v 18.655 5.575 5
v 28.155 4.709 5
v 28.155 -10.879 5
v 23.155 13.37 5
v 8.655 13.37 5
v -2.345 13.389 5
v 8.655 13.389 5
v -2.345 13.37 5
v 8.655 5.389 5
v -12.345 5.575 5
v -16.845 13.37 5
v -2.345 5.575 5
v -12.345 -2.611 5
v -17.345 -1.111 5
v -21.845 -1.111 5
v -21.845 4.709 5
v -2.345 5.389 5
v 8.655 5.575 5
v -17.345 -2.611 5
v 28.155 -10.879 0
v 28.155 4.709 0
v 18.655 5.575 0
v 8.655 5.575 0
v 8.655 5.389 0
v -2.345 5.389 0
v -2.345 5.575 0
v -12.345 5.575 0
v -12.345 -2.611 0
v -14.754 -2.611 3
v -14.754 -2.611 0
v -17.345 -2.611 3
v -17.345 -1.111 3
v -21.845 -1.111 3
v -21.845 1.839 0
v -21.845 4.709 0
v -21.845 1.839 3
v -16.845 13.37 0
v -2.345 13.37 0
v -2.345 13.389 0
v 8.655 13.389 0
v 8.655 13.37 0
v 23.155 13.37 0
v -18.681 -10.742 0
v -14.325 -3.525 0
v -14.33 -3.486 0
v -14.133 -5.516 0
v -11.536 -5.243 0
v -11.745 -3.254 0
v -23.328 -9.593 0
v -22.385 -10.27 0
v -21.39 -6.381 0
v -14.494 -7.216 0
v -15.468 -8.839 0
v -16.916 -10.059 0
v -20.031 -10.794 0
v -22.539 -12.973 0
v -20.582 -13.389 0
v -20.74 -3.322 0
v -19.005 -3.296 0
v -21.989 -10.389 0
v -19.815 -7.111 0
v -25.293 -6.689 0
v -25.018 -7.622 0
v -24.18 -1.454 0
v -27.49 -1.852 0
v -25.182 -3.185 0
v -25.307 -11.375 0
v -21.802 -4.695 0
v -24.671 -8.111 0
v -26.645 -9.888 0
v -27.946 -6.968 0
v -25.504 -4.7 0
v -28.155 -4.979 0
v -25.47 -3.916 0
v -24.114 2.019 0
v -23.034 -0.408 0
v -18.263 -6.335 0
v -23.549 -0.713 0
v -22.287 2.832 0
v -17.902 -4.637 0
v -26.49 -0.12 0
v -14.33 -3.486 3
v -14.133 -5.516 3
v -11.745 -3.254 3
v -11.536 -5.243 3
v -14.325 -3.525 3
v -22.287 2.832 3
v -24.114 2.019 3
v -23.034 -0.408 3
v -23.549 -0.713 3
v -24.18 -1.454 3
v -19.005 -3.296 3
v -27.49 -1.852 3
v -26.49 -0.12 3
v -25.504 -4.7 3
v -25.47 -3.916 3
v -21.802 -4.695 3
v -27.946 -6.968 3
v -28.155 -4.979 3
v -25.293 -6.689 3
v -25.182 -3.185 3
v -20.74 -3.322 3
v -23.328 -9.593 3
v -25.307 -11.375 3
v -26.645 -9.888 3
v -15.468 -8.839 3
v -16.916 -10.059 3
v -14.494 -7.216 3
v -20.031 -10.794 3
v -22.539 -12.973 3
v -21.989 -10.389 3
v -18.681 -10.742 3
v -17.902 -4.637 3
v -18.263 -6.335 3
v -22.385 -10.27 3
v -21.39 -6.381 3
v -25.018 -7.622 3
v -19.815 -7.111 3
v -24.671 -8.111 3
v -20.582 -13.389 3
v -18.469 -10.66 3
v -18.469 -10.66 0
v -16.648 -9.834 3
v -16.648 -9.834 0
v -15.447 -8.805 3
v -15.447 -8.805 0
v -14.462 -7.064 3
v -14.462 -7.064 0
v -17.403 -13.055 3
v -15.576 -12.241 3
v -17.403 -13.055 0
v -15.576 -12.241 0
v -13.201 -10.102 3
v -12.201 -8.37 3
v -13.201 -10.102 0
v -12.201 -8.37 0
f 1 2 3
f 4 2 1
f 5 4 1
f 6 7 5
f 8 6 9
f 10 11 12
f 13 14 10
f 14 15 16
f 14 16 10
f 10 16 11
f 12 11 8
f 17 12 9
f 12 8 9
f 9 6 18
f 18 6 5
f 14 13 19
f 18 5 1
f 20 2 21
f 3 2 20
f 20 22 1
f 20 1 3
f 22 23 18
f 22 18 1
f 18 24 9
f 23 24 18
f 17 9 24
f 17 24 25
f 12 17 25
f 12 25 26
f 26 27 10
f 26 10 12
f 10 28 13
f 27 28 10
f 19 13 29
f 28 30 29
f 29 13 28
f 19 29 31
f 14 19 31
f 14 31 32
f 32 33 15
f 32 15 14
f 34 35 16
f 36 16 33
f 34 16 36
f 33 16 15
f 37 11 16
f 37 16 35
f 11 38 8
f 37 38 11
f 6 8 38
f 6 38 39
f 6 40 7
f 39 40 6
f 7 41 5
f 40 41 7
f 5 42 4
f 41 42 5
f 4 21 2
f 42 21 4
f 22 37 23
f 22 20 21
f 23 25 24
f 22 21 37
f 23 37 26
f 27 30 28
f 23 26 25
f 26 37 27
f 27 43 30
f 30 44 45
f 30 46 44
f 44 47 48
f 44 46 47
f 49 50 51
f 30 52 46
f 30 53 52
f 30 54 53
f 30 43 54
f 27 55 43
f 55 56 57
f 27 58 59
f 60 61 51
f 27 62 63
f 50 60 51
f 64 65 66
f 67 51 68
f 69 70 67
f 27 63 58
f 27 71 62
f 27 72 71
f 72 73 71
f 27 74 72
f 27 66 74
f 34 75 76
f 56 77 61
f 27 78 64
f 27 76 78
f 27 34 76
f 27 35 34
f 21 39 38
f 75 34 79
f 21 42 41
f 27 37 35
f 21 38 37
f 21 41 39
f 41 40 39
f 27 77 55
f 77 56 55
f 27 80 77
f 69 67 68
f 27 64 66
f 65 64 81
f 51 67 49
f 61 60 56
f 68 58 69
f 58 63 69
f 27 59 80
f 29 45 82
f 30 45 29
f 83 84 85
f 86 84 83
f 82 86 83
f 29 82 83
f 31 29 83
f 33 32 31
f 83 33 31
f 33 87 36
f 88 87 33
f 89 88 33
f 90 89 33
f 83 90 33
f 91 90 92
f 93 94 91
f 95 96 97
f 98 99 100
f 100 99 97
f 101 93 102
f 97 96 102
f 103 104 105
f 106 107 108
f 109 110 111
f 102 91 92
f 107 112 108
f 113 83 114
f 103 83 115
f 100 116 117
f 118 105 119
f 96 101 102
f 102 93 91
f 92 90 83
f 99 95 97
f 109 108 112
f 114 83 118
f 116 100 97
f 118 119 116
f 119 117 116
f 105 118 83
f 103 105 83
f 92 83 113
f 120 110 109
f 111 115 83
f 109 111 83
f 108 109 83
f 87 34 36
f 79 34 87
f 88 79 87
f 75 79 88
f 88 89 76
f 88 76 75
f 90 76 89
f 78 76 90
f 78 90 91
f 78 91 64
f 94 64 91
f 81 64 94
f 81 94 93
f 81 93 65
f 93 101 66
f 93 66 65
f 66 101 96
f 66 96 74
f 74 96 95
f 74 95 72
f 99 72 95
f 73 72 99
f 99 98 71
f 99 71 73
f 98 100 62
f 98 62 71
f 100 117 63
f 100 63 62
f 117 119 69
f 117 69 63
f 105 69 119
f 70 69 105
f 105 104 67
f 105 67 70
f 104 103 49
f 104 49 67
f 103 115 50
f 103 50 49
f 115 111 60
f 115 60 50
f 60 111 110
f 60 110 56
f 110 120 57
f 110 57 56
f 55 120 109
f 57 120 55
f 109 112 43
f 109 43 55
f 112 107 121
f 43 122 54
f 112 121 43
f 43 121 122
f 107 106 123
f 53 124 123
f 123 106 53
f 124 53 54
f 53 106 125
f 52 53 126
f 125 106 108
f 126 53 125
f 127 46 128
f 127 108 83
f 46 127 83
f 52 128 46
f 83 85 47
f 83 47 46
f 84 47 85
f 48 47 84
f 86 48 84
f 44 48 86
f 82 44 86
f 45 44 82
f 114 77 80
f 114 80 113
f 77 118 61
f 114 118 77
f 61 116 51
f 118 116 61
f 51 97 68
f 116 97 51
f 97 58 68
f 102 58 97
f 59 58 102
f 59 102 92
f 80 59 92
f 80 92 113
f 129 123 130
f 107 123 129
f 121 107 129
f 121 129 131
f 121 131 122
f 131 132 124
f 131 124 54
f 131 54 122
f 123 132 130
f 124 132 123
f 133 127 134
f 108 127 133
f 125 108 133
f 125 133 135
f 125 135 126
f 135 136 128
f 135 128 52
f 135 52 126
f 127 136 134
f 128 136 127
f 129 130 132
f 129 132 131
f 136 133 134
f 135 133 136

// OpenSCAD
module object1(scale) {polyhedron(
 points=[[2.815467e+01,-1.087913e+01,5.000000e+00],[2.815467e+01,4.709322e+00,5.000000e+00],[1.865467e+01,5.575347e+00,5.000000e+00],[1.865467e+01,5.575347e+00,5.000000e+00],[2.815467e+01,4.709322e+00,5.000000e+00],[2.315467e+01,1.336958e+01,5.000000e+00],[1.865467e+01,5.575347e+00,5.000000e+00],[2.315467e+01,1.336958e+01,5.000000e+00],[8.654667e+00,1.336958e+01,5.000000e+00],[8.654667e+00,1.336958e+01,5.000000e+00],[8.654667e+00,1.338881e+01,5.000000e+00],[-2.345333e+00,1.338881e+01,5.000000e+00],[8.654667e+00,5.388815e+00,5.000000e+00],[-2.345333e+00,1.338881e+01,5.000000e+00],[-2.345333e+00,1.336958e+01,5.000000e+00],[-2.345333e+00,5.575347e+00,5.000000e+00],[-1.684533e+01,1.336958e+01,5.000000e+00],[-1.234533e+01,5.575347e+00,5.000000e+00],[-1.234533e+01,5.575347e+00,5.000000e+00],[-1.734533e+01,-1.111185e+00,5.000000e+00],[-1.234533e+01,-2.611185e+00,5.000000e+00],[-2.184533e+01,4.709322e+00,5.000000e+00],[-2.184533e+01,-1.111185e+00,5.000000e+00],[-1.734533e+01,-1.111185e+00,5.000000e+00],[-1.234533e+01,5.575347e+00,5.000000e+00],[-2.184533e+01,4.709322e+00,5.000000e+00],[-1.734533e+01,-1.111185e+00,5.000000e+00],[-1.684533e+01,1.336958e+01,5.000000e+00],[-2.184533e+01,4.709322e+00,5.000000e+00],[-1.234533e+01,5.575347e+00,5.000000e+00],[-2.345333e+00,1.336958e+01,5.000000e+00],[-1.684533e+01,1.336958e+01,5.000000e+00],[-2.345333e+00,5.575347e+00,5.000000e+00],[8.654667e+00,5.388815e+00,5.000000e+00],[-2.345333e+00,5.575347e+00,5.000000e+00],[-2.345333e+00,5.388815e+00,5.000000e+00],[8.654667e+00,5.388815e+00,5.000000e+00],[-2.345333e+00,1.336958e+01,5.000000e+00],[-2.345333e+00,5.575347e+00,5.000000e+00],[8.654667e+00,5.575347e+00,5.000000e+00],[-2.345333e+00,1.338881e+01,5.000000e+00],[8.654667e+00,5.388815e+00,5.000000e+00],[8.654667e+00,1.336958e+01,5.000000e+00],[-2.345333e+00,1.338881e+01,5.000000e+00],[8.654667e+00,5.575347e+00,5.000000e+00],[-1.734533e+01,-2.611185e+00,5.000000e+00],[-1.234533e+01,-2.611185e+00,5.000000e+00],[-1.734533e+01,-1.111185e+00,5.000000e+00],[1.865467e+01,5.575347e+00,5.000000e+00],[8.654667e+00,1.336958e+01,5.000000e+00],[8.654667e+00,5.575347e+00,5.000000e+00],[2.815467e+01,4.709322e+00,7.105427e-15],[2.815467e+01,4.709322e+00,5.000000e+00],[2.815467e+01,-1.087913e+01,7.105427e-15],[2.815467e+01,-1.087913e+01,7.105427e-15],[2.815467e+01,4.709322e+00,5.000000e+00],[2.815467e+01,-1.087913e+01,5.000000e+00],[1.865467e+01,5.575347e+00,5.000000e+00],[1.865467e+01,5.575347e+00,5.773160e-15],[2.815467e+01,-1.087913e+01,7.105427e-15],[2.815467e+01,-1.087913e+01,5.000000e+00],[1.865467e+01,5.575347e+00,5.000000e+00],[2.815467e+01,-1.087913e+01,7.105427e-15],[8.654667e+00,5.575347e+00,5.000000e+00],[8.654667e+00,5.575347e+00,4.440892e-15],[1.865467e+01,5.575347e+00,5.773160e-15],[1.865467e+01,5.575347e+00,5.000000e+00],[8.654667e+00,5.575347e+00,5.000000e+00],[1.865467e+01,5.575347e+00,5.773160e-15],[8.654667e+00,5.388815e+00,5.000000e+00],[8.654667e+00,5.388815e+00,4.440892e-15],[8.654667e+00,5.575347e+00,5.000000e+00],[8.654667e+00,5.575347e+00,5.000000e+00],[8.654667e+00,5.388815e+00,4.440892e-15],[8.654667e+00,5.575347e+00,4.440892e-15],[8.654667e+00,5.388815e+00,4.440892e-15],[8.654667e+00,5.388815e+00,5.000000e+00],[-2.345333e+00,5.388815e+00,5.000000e+00],[-2.345333e+00,5.388815e+00,3.108624e-15],[8.654667e+00,5.388815e+00,4.440892e-15],[-2.345333e+00,5.388815e+00,5.000000e+00],[-2.345333e+00,5.388815e+00,3.108624e-15],[-2.345333e+00,5.388815e+00,5.000000e+00],[-2.345333e+00,5.575347e+00,5.000000e+00],[-2.345333e+00,5.575347e+00,3.108624e-15],[-2.345333e+00,5.388815e+00,3.108624e-15],[-2.345333e+00,5.575347e+00,5.000000e+00],[-1.234533e+01,5.575347e+00,5.000000e+00],[-1.234533e+01,5.575347e+00,1.776357e-15],[-2.345333e+00,5.575347e+00,3.108624e-15],[-2.345333e+00,5.575347e+00,5.000000e+00],[-1.234533e+01,5.575347e+00,5.000000e+00],[-2.345333e+00,5.575347e+00,3.108624e-15],[-1.234533e+01,-2.611185e+00,5.000000e+00],[-1.234533e+01,-2.611185e+00,1.776357e-15],[-1.234533e+01,5.575347e+00,5.000000e+00],[-1.234533e+01,5.575347e+00,5.000000e+00],[-1.234533e+01,-2.611185e+00,1.776357e-15],[-1.234533e+01,5.575347e+00,1.776357e-15],[-1.475442e+01,-2.611185e+00,3.000000e+00],[-1.234533e+01,-2.611185e+00,5.000000e+00],[-1.734533e+01,-2.611185e+00,5.000000e+00],[-1.475442e+01,-2.611185e+00,3.000000e+00],[-1.475442e+01,-2.611185e+00,1.776357e-15],[-1.234533e+01,-2.611185e+00,1.776357e-15],[-1.234533e+01,-2.611185e+00,1.776357e-15],[-1.234533e+01,-2.611185e+00,5.000000e+00],[-1.475442e+01,-2.611185e+00,3.000000e+00],[-1.734533e+01,-2.611185e+00,3.000000e+00],[-1.475442e+01,-2.611185e+00,3.000000e+00],[-1.734533e+01,-2.611185e+00,5.000000e+00],[-1.734533e+01,-2.611185e+00,3.000000e+00],[-1.734533e+01,-2.611185e+00,5.000000e+00],[-1.734533e+01,-1.111185e+00,5.000000e+00],[-1.734533e+01,-1.111185e+00,3.000000e+00],[-1.734533e+01,-2.611185e+00,3.000000e+00],[-1.734533e+01,-1.111185e+00,5.000000e+00],[-2.184533e+01,-1.111185e+00,5.000000e+00],[-2.184533e+01,-1.111185e+00,3.000000e+00],[-1.734533e+01,-1.111185e+00,3.000000e+00],[-1.734533e+01,-1.111185e+00,5.000000e+00],[-2.184533e+01,-1.111185e+00,5.000000e+00],[-1.734533e+01,-1.111185e+00,3.000000e+00],[-2.184533e+01,4.709322e+00,5.000000e+00],[-2.184533e+01,4.709322e+00,8.881784e-16],[-2.184533e+01,1.839482e+00,8.881784e-16],[-2.184533e+01,-1.111185e+00,3.000000e+00],[-2.184533e+01,4.709322e+00,5.000000e+00],[-2.184533e+01,1.839482e+00,3.000000e+00],[-2.184533e+01,1.839482e+00,3.000000e+00],[-2.184533e+01,4.709322e+00,5.000000e+00],[-2.184533e+01,1.839482e+00,8.881784e-16],[-2.184533e+01,-1.111185e+00,5.000000e+00],[-2.184533e+01,4.709322e+00,5.000000e+00],[-2.184533e+01,-1.111185e+00,3.000000e+00],[-2.184533e+01,4.709322e+00,5.000000e+00],[-1.684533e+01,1.336958e+01,5.000000e+00],[-1.684533e+01,1.336958e+01,1.332268e-15],[-2.184533e+01,4.709322e+00,8.881784e-16],[-2.184533e+01,4.709322e+00,5.000000e+00],[-1.684533e+01,1.336958e+01,1.332268e-15],[-2.345333e+00,1.336958e+01,5.000000e+00],[-2.345333e+00,1.336958e+01,3.108624e-15],[-1.684533e+01,1.336958e+01,5.000000e+00],[-1.684533e+01,1.336958e+01,5.000000e+00],[-2.345333e+00,1.336958e+01,3.108624e-15],[-1.684533e+01,1.336958e+01,1.332268e-15],[-2.345333e+00,1.336958e+01,3.108624e-15],[-2.345333e+00,1.336958e+01,5.000000e+00],[-2.345333e+00,1.338881e+01,5.000000e+00],[-2.345333e+00,1.338881e+01,3.108624e-15],[-2.345333e+00,1.336958e+01,3.108624e-15],[-2.345333e+00,1.338881e+01,5.000000e+00],[8.654667e+00,1.338881e+01,5.000000e+00],[8.654667e+00,1.338881e+01,4.440892e-15],[-2.345333e+00,1.338881e+01,5.000000e+00],[-2.345333e+00,1.338881e+01,5.000000e+00],[8.654667e+00,1.338881e+01,4.440892e-15],[-2.345333e+00,1.338881e+01,3.108624e-15],[8.654667e+00,1.336958e+01,5.000000e+00],[8.654667e+00,1.336958e+01,4.440892e-15],[8.654667e+00,1.338881e+01,5.000000e+00],[8.654667e+00,1.338881e+01,5.000000e+00],[8.654667e+00,1.336958e+01,4.440892e-15],[8.654667e+00,1.338881e+01,4.440892e-15],[2.315467e+01,1.336958e+01,5.000000e+00],[2.315467e+01,1.336958e+01,6.217249e-15],[8.654667e+00,1.336958e+01,5.000000e+00],[8.654667e+00,1.336958e+01,5.000000e+00],[2.315467e+01,1.336958e+01,6.217249e-15],[8.654667e+00,1.336958e+01,4.440892e-15],[2.815467e+01,4.709322e+00,5.000000e+00],[2.815467e+01,4.709322e+00,7.105427e-15],[2.315467e+01,1.336958e+01,5.000000e+00],[2.315467e+01,1.336958e+01,5.000000e+00],[2.815467e+01,4.709322e+00,7.105427e-15],[2.315467e+01,1.336958e+01,6.217249e-15],[8.654667e+00,5.575347e+00,4.440892e-15],[-1.684533e+01,1.336958e+01,1.332268e-15],[1.865467e+01,5.575347e+00,5.773160e-15],[2.815467e+01,4.709322e+00,7.105427e-15],[2.815467e+01,-1.087913e+01,7.105427e-15],[1.865467e+01,5.575347e+00,5.773160e-15],[8.654667e+00,5.388815e+00,4.440892e-15],[-2.345333e+00,5.388815e+00,3.108624e-15],[8.654667e+00,5.575347e+00,4.440892e-15],[-1.684533e+01,1.336958e+01,1.332268e-15],[2.815467e+01,4.709322e+00,7.105427e-15],[1.865467e+01,5.575347e+00,5.773160e-15],[-2.345333e+00,5.575347e+00,3.108624e-15],[-1.684533e+01,1.336958e+01,1.332268e-15],[8.654667e+00,5.575347e+00,4.440892e-15],[-1.234533e+01,-2.611185e+00,1.776357e-15],[-1.475442e+01,-2.611185e+00,1.776357e-15],[-1.234533e+01,5.575347e+00,1.776357e-15],[-2.345333e+00,5.388815e+00,3.108624e-15],[-2.345333e+00,5.575347e+00,3.108624e-15],[8.654667e+00,5.575347e+00,4.440892e-15],[-1.234533e+01,5.575347e+00,1.776357e-15],[-1.684533e+01,1.336958e+01,1.332268e-15],[-2.345333e+00,5.575347e+00,3.108624e-15],[-1.475442e+01,-2.611185e+00,1.776357e-15],[-1.868086e+01,-1.074204e+01,1.332268e-15],[-1.234533e+01,5.575347e+00,1.776357e-15],[-1.432988e+01,-3.485694e+00,1.776357e-15],[-1.432503e+01,-3.525469e+00,1.776357e-15],[-1.475442e+01,-2.611185e+00,1.776357e-15],[-1.432503e+01,-3.525469e+00,1.776357e-15],[-1.413316e+01,-5.516321e+00,1.776357e-15],[-1.475442e+01,-2.611185e+00,1.776357e-15],[-1.174506e+01,-3.254303e+00,2.220446e-15],[-1.153600e+01,-5.243348e+00,2.220446e-15],[-1.432503e+01,-3.525469e+00,1.776357e-15],[-1.153600e+01,-5.243348e+00,2.220446e-15],[-1.413316e+01,-5.516321e+00,1.776357e-15],[-1.432503e+01,-3.525469e+00,1.776357e-15],[-2.139017e+01,-6.381416e+00,8.881784e-16],[-2.238494e+01,-1.026996e+01,8.881784e-16],[-2.332804e+01,-9.592663e+00,4.440892e-16],[-1.413316e+01,-5.516321e+00,1.776357e-15],[-1.449446e+01,-7.216111e+00,1.776357e-15],[-1.475442e+01,-2.611185e+00,1.776357e-15],[-1.449446e+01,-7.216111e+00,1.776357e-15],[-1.546786e+01,-8.839484e+00,1.332268e-15],[-1.475442e+01,-2.611185e+00,1.776357e-15],[-1.546786e+01,-8.839484e+00,1.332268e-15],[-1.691562e+01,-1.005884e+01,1.332268e-15],[-1.475442e+01,-2.611185e+00,1.776357e-15],[-1.691562e+01,-1.005884e+01,1.332268e-15],[-1.868086e+01,-1.074204e+01,1.332268e-15],[-1.475442e+01,-2.611185e+00,1.776357e-15],[-1.868086e+01,-1.074204e+01,1.332268e-15],[-2.003094e+01,-1.079415e+01,8.881784e-16],[-1.234533e+01,5.575347e+00,1.776357e-15],[-2.058246e+01,-1.338881e+01,8.881784e-16],[-2.253875e+01,-1.297299e+01,8.881784e-16],[-2.003094e+01,-1.079415e+01,8.881784e-16],[-1.900462e+01,-3.296467e+00,1.332268e-15],[-2.073996e+01,-3.322430e+00,8.881784e-16],[-1.234533e+01,5.575347e+00,1.776357e-15],[-2.139017e+01,-6.381416e+00,8.881784e-16],[-1.981541e+01,-7.110961e+00,8.881784e-16],[-2.198948e+01,-1.038888e+01,8.881784e-16],[-2.501802e+01,-7.622321e+00,4.440892e-16],[-2.529301e+01,-6.689268e+00,4.440892e-16],[-1.234533e+01,5.575347e+00,1.776357e-15],[-2.139017e+01,-6.381416e+00,8.881784e-16],[-2.198948e+01,-1.038888e+01,8.881784e-16],[-2.238494e+01,-1.026996e+01,8.881784e-16],[-2.518212e+01,-3.184691e+00,4.440892e-16],[-2.749004e+01,-1.852210e+00,0.000000e+00],[-2.418016e+01,-1.453767e+00,4.440892e-16],[-2.180163e+01,-4.695363e+00,8.881784e-16],[-2.139017e+01,-6.381416e+00,8.881784e-16],[-2.530715e+01,-1.137466e+01,4.440892e-16],[-2.530715e+01,-1.137466e+01,4.440892e-16],[-2.664541e+01,-9.888369e+00,0.000000e+00],[-2.467126e+01,-8.110835e+00,4.440892e-16],[-2.073996e+01,-3.322430e+00,8.881784e-16],[-2.501802e+01,-7.622321e+00,4.440892e-16],[-1.234533e+01,5.575347e+00,1.776357e-15],[-2.529301e+01,-6.689268e+00,4.440892e-16],[-2.794561e+01,-6.968068e+00,0.000000e+00],[-1.234533e+01,5.575347e+00,1.776357e-15],[-2.794561e+01,-6.968068e+00,0.000000e+00],[-2.550431e+01,-4.700459e+00,4.440892e-16],[-1.234533e+01,5.575347e+00,1.776357e-15],[-2.794561e+01,-6.968068e+00,0.000000e+00],[-2.815467e+01,-4.979023e+00,0.000000e+00],[-2.550431e+01,-4.700459e+00,4.440892e-16],[-2.550431e+01,-4.700459e+00,4.440892e-16],[-2.546968e+01,-3.915694e+00,4.440892e-16],[-1.234533e+01,5.575347e+00,1.776357e-15],[-2.546968e+01,-3.915694e+00,4.440892e-16],[-2.518212e+01,-3.184691e+00,4.440892e-16],[-1.234533e+01,5.575347e+00,1.776357e-15],[-2.303397e+01,-4.079899e-01,4.440892e-16],[-2.411446e+01,2.018828e+00,4.440892e-16],[-2.184533e+01,1.839482e+00,8.881784e-16],[-1.981541e+01,-7.110961e+00,8.881784e-16],[-1.826319e+01,-6.334633e+00,1.332268e-15],[-2.253875e+01,-1.297299e+01,8.881784e-16],[-2.418016e+01,-1.453767e+00,4.440892e-16],[-2.354945e+01,-7.132277e-01,4.440892e-16],[-1.234533e+01,5.575347e+00,1.776357e-15],[-2.354945e+01,-7.132277e-01,4.440892e-16],[-2.303397e+01,-4.079899e-01,4.440892e-16],[-1.234533e+01,5.575347e+00,1.776357e-15],[-2.303397e+01,-4.079899e-01,4.440892e-16],[-2.184533e+01,1.839482e+00,8.881784e-16],[-1.234533e+01,5.575347e+00,1.776357e-15],[-2.184533e+01,1.839482e+00,8.881784e-16],[-2.184533e+01,4.709322e+00,8.881784e-16],[-1.234533e+01,5.575347e+00,1.776357e-15],[-2.345333e+00,1.336958e+01,3.108624e-15],[-2.345333e+00,1.338881e+01,3.108624e-15],[2.815467e+01,4.709322e+00,7.105427e-15],[-2.228736e+01,2.832302e+00,8.881784e-16],[-2.184533e+01,1.839482e+00,8.881784e-16],[-2.411446e+01,2.018828e+00,4.440892e-16],[8.654667e+00,1.336958e+01,4.440892e-15],[2.315467e+01,1.336958e+01,6.217249e-15],[2.815467e+01,4.709322e+00,7.105427e-15],[-2.184533e+01,4.709322e+00,8.881784e-16],[-1.684533e+01,1.336958e+01,1.332268e-15],[-1.234533e+01,5.575347e+00,1.776357e-15],[-1.684533e+01,1.336958e+01,1.332268e-15],[-2.345333e+00,1.336958e+01,3.108624e-15],[2.815467e+01,4.709322e+00,7.105427e-15],[-2.345333e+00,1.338881e+01,3.108624e-15],[8.654667e+00,1.336958e+01,4.440892e-15],[2.815467e+01,4.709322e+00,7.105427e-15],[-2.345333e+00,1.338881e+01,3.108624e-15],[8.654667e+00,1.338881e+01,4.440892e-15],[8.654667e+00,1.336958e+01,4.440892e-15],[-2.003094e+01,-1.079415e+01,8.881784e-16],[-1.826319e+01,-6.334633e+00,1.332268e-15],[-1.234533e+01,5.575347e+00,1.776357e-15],[-2.003094e+01,-1.079415e+01,8.881784e-16],[-2.253875e+01,-1.297299e+01,8.881784e-16],[-1.826319e+01,-6.334633e+00,1.332268e-15],[-1.826319e+01,-6.334633e+00,1.332268e-15],[-1.790235e+01,-4.637025e+00,1.332268e-15],[-1.234533e+01,5.575347e+00,1.776357e-15],[-2.180163e+01,-4.695363e+00,8.881784e-16],[-2.530715e+01,-1.137466e+01,4.440892e-16],[-2.467126e+01,-8.110835e+00,4.440892e-16],[-2.518212e+01,-3.184691e+00,4.440892e-16],[-2.418016e+01,-1.453767e+00,4.440892e-16],[-1.234533e+01,5.575347e+00,1.776357e-15],[-2.649004e+01,-1.201605e-01,0.000000e+00],[-2.418016e+01,-1.453767e+00,4.440892e-16],[-2.749004e+01,-1.852210e+00,0.000000e+00],[-2.332804e+01,-9.592663e+00,4.440892e-16],[-2.530715e+01,-1.137466e+01,4.440892e-16],[-2.139017e+01,-6.381416e+00,8.881784e-16],[-2.253875e+01,-1.297299e+01,8.881784e-16],[-2.198948e+01,-1.038888e+01,8.881784e-16],[-1.981541e+01,-7.110961e+00,8.881784e-16],[-2.467126e+01,-8.110835e+00,4.440892e-16],[-2.073996e+01,-3.322430e+00,8.881784e-16],[-2.180163e+01,-4.695363e+00,8.881784e-16],[-2.467126e+01,-8.110835e+00,4.440892e-16],[-2.501802e+01,-7.622321e+00,4.440892e-16],[-2.073996e+01,-3.322430e+00,8.881784e-16],[-1.790235e+01,-4.637025e+00,1.332268e-15],[-1.900462e+01,-3.296467e+00,1.332268e-15],[-1.234533e+01,5.575347e+00,1.776357e-15],[-1.432988e+01,-3.485694e+00,3.000000e+00],[-1.432988e+01,-3.485694e+00,1.776357e-15],[-1.475442e+01,-2.611185e+00,3.000000e+00],[-1.475442e+01,-2.611185e+00,3.000000e+00],[-1.432988e+01,-3.485694e+00,1.776357e-15],[-1.475442e+01,-2.611185e+00,1.776357e-15],[-1.153600e+01,-5.243348e+00,3.000000e+00],[-1.174506e+01,-3.254303e+00,3.000000e+00],[-1.413316e+01,-5.516321e+00,3.000000e+00],[-1.413316e+01,-5.516321e+00,3.000000e+00],[-1.174506e+01,-3.254303e+00,3.000000e+00],[-1.432503e+01,-3.525469e+00,3.000000e+00],[-1.413316e+01,-5.516321e+00,3.000000e+00],[-1.432503e+01,-3.525469e+00,3.000000e+00],[-1.432988e+01,-3.485694e+00,3.000000e+00],[-1.413316e+01,-5.516321e+00,3.000000e+00],[-1.432988e+01,-3.485694e+00,3.000000e+00],[-1.475442e+01,-2.611185e+00,3.000000e+00],[-1.413316e+01,-5.516321e+00,3.000000e+00],[-1.475442e+01,-2.611185e+00,3.000000e+00],[-1.734533e+01,-2.611185e+00,3.000000e+00],[-1.734533e+01,-2.611185e+00,3.000000e+00],[-1.734533e+01,-1.111185e+00,3.000000e+00],[-2.184533e+01,-1.111185e+00,3.000000e+00],[-1.734533e+01,-2.611185e+00,3.000000e+00],[-2.184533e+01,-1.111185e+00,3.000000e+00],[-1.413316e+01,-5.516321e+00,3.000000e+00],[-2.184533e+01,1.839482e+00,3.000000e+00],[-2.228736e+01,2.832302e+00,3.000000e+00],[-2.184533e+01,-1.111185e+00,3.000000e+00],[-2.184533e+01,-1.111185e+00,3.000000e+00],[-2.228736e+01,2.832302e+00,3.000000e+00],[-2.411446e+01,2.018828e+00,3.000000e+00],[-2.184533e+01,-1.111185e+00,3.000000e+00],[-2.411446e+01,2.018828e+00,3.000000e+00],[-2.303397e+01,-4.079899e-01,3.000000e+00],[-2.184533e+01,-1.111185e+00,3.000000e+00],[-2.303397e+01,-4.079899e-01,3.000000e+00],[-2.354945e+01,-7.132277e-01,3.000000e+00],[-2.184533e+01,-1.111185e+00,3.000000e+00],[-2.354945e+01,-7.132277e-01,3.000000e+00],[-1.413316e+01,-5.516321e+00,3.000000e+00],[-1.900462e+01,-3.296467e+00,3.000000e+00],[-2.354945e+01,-7.132277e-01,3.000000e+00],[-2.418016e+01,-1.453767e+00,3.000000e+00],[-2.418016e+01,-1.453767e+00,3.000000e+00],[-2.649004e+01,-1.201605e-01,3.000000e+00],[-2.749004e+01,-1.852210e+00,3.000000e+00],[-2.180163e+01,-4.695363e+00,3.000000e+00],[-2.546968e+01,-3.915694e+00,3.000000e+00],[-2.550431e+01,-4.700459e+00,3.000000e+00],[-2.529301e+01,-6.689268e+00,3.000000e+00],[-2.815467e+01,-4.979023e+00,3.000000e+00],[-2.794561e+01,-6.968068e+00,3.000000e+00],[-2.180163e+01,-4.695363e+00,3.000000e+00],[-2.815467e+01,-4.979023e+00,3.000000e+00],[-2.529301e+01,-6.689268e+00,3.000000e+00],[-2.073996e+01,-3.322430e+00,3.000000e+00],[-2.749004e+01,-1.852210e+00,3.000000e+00],[-2.518212e+01,-3.184691e+00,3.000000e+00],[-2.073996e+01,-3.322430e+00,3.000000e+00],[-2.546968e+01,-3.915694e+00,3.000000e+00],[-2.180163e+01,-4.695363e+00,3.000000e+00],[-2.664541e+01,-9.888369e+00,3.000000e+00],[-2.530715e+01,-1.137466e+01,3.000000e+00],[-2.332804e+01,-9.592663e+00,3.000000e+00],[-1.449446e+01,-7.216111e+00,3.000000e+00],[-1.691562e+01,-1.005884e+01,3.000000e+00],[-1.546786e+01,-8.839484e+00,3.000000e+00],[-2.198948e+01,-1.038888e+01,3.000000e+00],[-2.253875e+01,-1.297299e+01,3.000000e+00],[-2.003094e+01,-1.079415e+01,3.000000e+00],[-1.900462e+01,-3.296467e+00,3.000000e+00],[-2.418016e+01,-1.453767e+00,3.000000e+00],[-2.073996e+01,-3.322430e+00,3.000000e+00],[-1.449446e+01,-7.216111e+00,3.000000e+00],[-1.868086e+01,-1.074204e+01,3.000000e+00],[-1.691562e+01,-1.005884e+01,3.000000e+00],[-1.826319e+01,-6.334633e+00,3.000000e+00],[-1.413316e+01,-5.516321e+00,3.000000e+00],[-1.790235e+01,-4.637025e+00,3.000000e+00],[-2.238494e+01,-1.026996e+01,3.000000e+00],[-1.413316e+01,-5.516321e+00,3.000000e+00],[-2.332804e+01,-9.592663e+00,3.000000e+00],[-2.501802e+01,-7.622321e+00,3.000000e+00],[-2.139017e+01,-6.381416e+00,3.000000e+00],[-2.529301e+01,-6.689268e+00,3.000000e+00],[-2.467126e+01,-8.110835e+00,3.000000e+00],[-2.664541e+01,-9.888369e+00,3.000000e+00],[-1.981541e+01,-7.110961e+00,3.000000e+00],[-2.073996e+01,-3.322430e+00,3.000000e+00],[-2.518212e+01,-3.184691e+00,3.000000e+00],[-2.546968e+01,-3.915694e+00,3.000000e+00],[-2.418016e+01,-1.453767e+00,3.000000e+00],[-2.749004e+01,-1.852210e+00,3.000000e+00],[-2.073996e+01,-3.322430e+00,3.000000e+00],[-1.413316e+01,-5.516321e+00,3.000000e+00],[-2.354945e+01,-7.132277e-01,3.000000e+00],[-1.900462e+01,-3.296467e+00,3.000000e+00],[-2.180163e+01,-4.695363e+00,3.000000e+00],[-2.550431e+01,-4.700459e+00,3.000000e+00],[-2.815467e+01,-4.979023e+00,3.000000e+00],[-1.868086e+01,-1.074204e+01,3.000000e+00],[-1.449446e+01,-7.216111e+00,3.000000e+00],[-2.003094e+01,-1.079415e+01,3.000000e+00],[-1.981541e+01,-7.110961e+00,3.000000e+00],[-1.413316e+01,-5.516321e+00,3.000000e+00],[-1.826319e+01,-6.334633e+00,3.000000e+00],[-2.180163e+01,-4.695363e+00,3.000000e+00],[-2.529301e+01,-6.689268e+00,3.000000e+00],[-2.139017e+01,-6.381416e+00,3.000000e+00],[-2.139017e+01,-6.381416e+00,3.000000e+00],[-2.467126e+01,-8.110835e+00,3.000000e+00],[-1.981541e+01,-7.110961e+00,3.000000e+00],[-2.139017e+01,-6.381416e+00,3.000000e+00],[-2.501802e+01,-7.622321e+00,3.000000e+00],[-2.467126e+01,-8.110835e+00,3.000000e+00],[-1.413316e+01,-5.516321e+00,3.000000e+00],[-1.981541e+01,-7.110961e+00,3.000000e+00],[-2.664541e+01,-9.888369e+00,3.000000e+00],[-1.413316e+01,-5.516321e+00,3.000000e+00],[-2.664541e+01,-9.888369e+00,3.000000e+00],[-2.332804e+01,-9.592663e+00,3.000000e+00],[-1.790235e+01,-4.637025e+00,3.000000e+00],[-1.413316e+01,-5.516321e+00,3.000000e+00],[-1.900462e+01,-3.296467e+00,3.000000e+00],[-2.003094e+01,-1.079415e+01,3.000000e+00],[-2.253875e+01,-1.297299e+01,3.000000e+00],[-2.058246e+01,-1.338881e+01,3.000000e+00],[-1.413316e+01,-5.516321e+00,3.000000e+00],[-2.238494e+01,-1.026996e+01,3.000000e+00],[-2.198948e+01,-1.038888e+01,3.000000e+00],[-1.413316e+01,-5.516321e+00,3.000000e+00],[-2.198948e+01,-1.038888e+01,3.000000e+00],[-2.003094e+01,-1.079415e+01,3.000000e+00],[-1.413316e+01,-5.516321e+00,3.000000e+00],[-2.003094e+01,-1.079415e+01,3.000000e+00],[-1.449446e+01,-7.216111e+00,3.000000e+00],[-2.184533e+01,1.839482e+00,3.000000e+00],[-2.184533e+01,1.839482e+00,8.881784e-16],[-2.228736e+01,2.832302e+00,3.000000e+00],[-2.228736e+01,2.832302e+00,3.000000e+00],[-2.184533e+01,1.839482e+00,8.881784e-16],[-2.228736e+01,2.832302e+00,8.881784e-16],[-2.228736e+01,2.832302e+00,3.000000e+00],[-2.228736e+01,2.832302e+00,8.881784e-16],[-2.411446e+01,2.018828e+00,3.000000e+00],[-2.411446e+01,2.018828e+00,3.000000e+00],[-2.228736e+01,2.832302e+00,8.881784e-16],[-2.411446e+01,2.018828e+00,4.440892e-16],[-2.303397e+01,-4.079899e-01,4.440892e-16],[-2.303397e+01,-4.079899e-01,3.000000e+00],[-2.411446e+01,2.018828e+00,3.000000e+00],[-2.411446e+01,2.018828e+00,4.440892e-16],[-2.303397e+01,-4.079899e-01,4.440892e-16],[-2.411446e+01,2.018828e+00,3.000000e+00],[-2.303397e+01,-4.079899e-01,3.000000e+00],[-2.303397e+01,-4.079899e-01,4.440892e-16],[-2.354945e+01,-7.132277e-01,3.000000e+00],[-2.354945e+01,-7.132277e-01,3.000000e+00],[-2.303397e+01,-4.079899e-01,4.440892e-16],[-2.354945e+01,-7.132277e-01,4.440892e-16],[-2.418016e+01,-1.453767e+00,3.000000e+00],[-2.354945e+01,-7.132277e-01,3.000000e+00],[-2.354945e+01,-7.132277e-01,4.440892e-16],[-2.418016e+01,-1.453767e+00,4.440892e-16],[-2.418016e+01,-1.453767e+00,3.000000e+00],[-2.354945e+01,-7.132277e-01,4.440892e-16],[-2.418016e+01,-1.453767e+00,3.000000e+00],[-2.418016e+01,-1.453767e+00,4.440892e-16],[-2.649004e+01,-1.201605e-01,3.000000e+00],[-2.649004e+01,-1.201605e-01,3.000000e+00],[-2.418016e+01,-1.453767e+00,4.440892e-16],[-2.649004e+01,-1.201605e-01,0.000000e+00],[-2.749004e+01,-1.852210e+00,3.000000e+00],[-2.649004e+01,-1.201605e-01,3.000000e+00],[-2.649004e+01,-1.201605e-01,0.000000e+00],[-2.749004e+01,-1.852210e+00,0.000000e+00],[-2.749004e+01,-1.852210e+00,3.000000e+00],[-2.649004e+01,-1.201605e-01,0.000000e+00],[-2.518212e+01,-3.184691e+00,4.440892e-16],[-2.518212e+01,-3.184691e+00,3.000000e+00],[-2.749004e+01,-1.852210e+00,3.000000e+00],[-2.749004e+01,-1.852210e+00,0.000000e+00],[-2.518212e+01,-3.184691e+00,4.440892e-16],[-2.749004e+01,-1.852210e+00,3.000000e+00],[-2.546968e+01,-3.915694e+00,3.000000e+00],[-2.518212e+01,-3.184691e+00,3.000000e+00],[-2.518212e+01,-3.184691e+00,4.440892e-16],[-2.546968e+01,-3.915694e+00,4.440892e-16],[-2.546968e+01,-3.915694e+00,3.000000e+00],[-2.518212e+01,-3.184691e+00,4.440892e-16],[-2.550431e+01,-4.700459e+00,3.000000e+00],[-2.546968e+01,-3.915694e+00,3.000000e+00],[-2.546968e+01,-3.915694e+00,4.440892e-16],[-2.550431e+01,-4.700459e+00,4.440892e-16],[-2.550431e+01,-4.700459e+00,3.000000e+00],[-2.546968e+01,-3.915694e+00,4.440892e-16],[-2.550431e+01,-4.700459e+00,3.000000e+00],[-2.550431e+01,-4.700459e+00,4.440892e-16],[-2.815467e+01,-4.979023e+00,3.000000e+00],[-2.815467e+01,-4.979023e+00,3.000000e+00],[-2.550431e+01,-4.700459e+00,4.440892e-16],[-2.815467e+01,-4.979023e+00,0.000000e+00],[-2.794561e+01,-6.968068e+00,0.000000e+00],[-2.794561e+01,-6.968068e+00,3.000000e+00],[-2.815467e+01,-4.979023e+00,3.000000e+00],[-2.815467e+01,-4.979023e+00,0.000000e+00],[-2.794561e+01,-6.968068e+00,0.000000e+00],[-2.815467e+01,-4.979023e+00,3.000000e+00],[-2.529301e+01,-6.689268e+00,4.440892e-16],[-2.529301e+01,-6.689268e+00,3.000000e+00],[-2.794561e+01,-6.968068e+00,3.000000e+00],[-2.794561e+01,-6.968068e+00,0.000000e+00],[-2.529301e+01,-6.689268e+00,4.440892e-16],[-2.794561e+01,-6.968068e+00,3.000000e+00],[-2.501802e+01,-7.622321e+00,4.440892e-16],[-2.501802e+01,-7.622321e+00,3.000000e+00],[-2.529301e+01,-6.689268e+00,3.000000e+00],[-2.529301e+01,-6.689268e+00,4.440892e-16],[-2.501802e+01,-7.622321e+00,4.440892e-16],[-2.529301e+01,-6.689268e+00,3.000000e+00],[-2.467126e+01,-8.110835e+00,4.440892e-16],[-2.467126e+01,-8.110835e+00,3.000000e+00],[-2.501802e+01,-7.622321e+00,3.000000e+00],[-2.501802e+01,-7.622321e+00,4.440892e-16],[-2.467126e+01,-8.110835e+00,4.440892e-16],[-2.501802e+01,-7.622321e+00,3.000000e+00],[-2.467126e+01,-8.110835e+00,3.000000e+00],[-2.467126e+01,-8.110835e+00,4.440892e-16],[-2.664541e+01,-9.888369e+00,3.000000e+00],[-2.664541e+01,-9.888369e+00,3.000000e+00],[-2.467126e+01,-8.110835e+00,4.440892e-16],[-2.664541e+01,-9.888369e+00,0.000000e+00],[-2.530715e+01,-1.137466e+01,4.440892e-16],[-2.530715e+01,-1.137466e+01,3.000000e+00],[-2.664541e+01,-9.888369e+00,3.000000e+00],[-2.664541e+01,-9.888369e+00,0.000000e+00],[-2.530715e+01,-1.137466e+01,4.440892e-16],[-2.664541e+01,-9.888369e+00,3.000000e+00],[-2.332804e+01,-9.592663e+00,4.440892e-16],[-2.332804e+01,-9.592663e+00,3.000000e+00],[-2.530715e+01,-1.137466e+01,3.000000e+00],[-2.530715e+01,-1.137466e+01,4.440892e-16],[-2.332804e+01,-9.592663e+00,4.440892e-16],[-2.530715e+01,-1.137466e+01,3.000000e+00],[-2.238494e+01,-1.026996e+01,8.881784e-16],[-2.238494e+01,-1.026996e+01,3.000000e+00],[-2.332804e+01,-9.592663e+00,3.000000e+00],[-2.332804e+01,-9.592663e+00,4.440892e-16],[-2.238494e+01,-1.026996e+01,8.881784e-16],[-2.332804e+01,-9.592663e+00,3.000000e+00],[-2.198948e+01,-1.038888e+01,8.881784e-16],[-2.198948e+01,-1.038888e+01,3.000000e+00],[-2.238494e+01,-1.026996e+01,3.000000e+00],[-2.238494e+01,-1.026996e+01,8.881784e-16],[-2.198948e+01,-1.038888e+01,8.881784e-16],[-2.238494e+01,-1.026996e+01,3.000000e+00],[-2.253875e+01,-1.297299e+01,3.000000e+00],[-2.198948e+01,-1.038888e+01,3.000000e+00],[-2.198948e+01,-1.038888e+01,8.881784e-16],[-2.253875e+01,-1.297299e+01,8.881784e-16],[-2.253875e+01,-1.297299e+01,3.000000e+00],[-2.198948e+01,-1.038888e+01,8.881784e-16],[-2.058246e+01,-1.338881e+01,8.881784e-16],[-2.058246e+01,-1.338881e+01,3.000000e+00],[-2.253875e+01,-1.297299e+01,3.000000e+00],[-2.253875e+01,-1.297299e+01,8.881784e-16],[-2.058246e+01,-1.338881e+01,8.881784e-16],[-2.253875e+01,-1.297299e+01,3.000000e+00],[-2.003094e+01,-1.079415e+01,3.000000e+00],[-2.058246e+01,-1.338881e+01,3.000000e+00],[-2.003094e+01,-1.079415e+01,8.881784e-16],[-2.003094e+01,-1.079415e+01,8.881784e-16],[-2.058246e+01,-1.338881e+01,3.000000e+00],[-2.058246e+01,-1.338881e+01,8.881784e-16],[-1.868086e+01,-1.074204e+01,1.332268e-15],[-1.868086e+01,-1.074204e+01,3.000000e+00],[-2.003094e+01,-1.079415e+01,3.000000e+00],[-2.003094e+01,-1.079415e+01,8.881784e-16],[-1.868086e+01,-1.074204e+01,1.332268e-15],[-2.003094e+01,-1.079415e+01,3.000000e+00],[-1.846939e+01,-1.066019e+01,3.000000e+00],[-1.691562e+01,-1.005884e+01,3.000000e+00],[-1.868086e+01,-1.074204e+01,3.000000e+00],[-1.691562e+01,-1.005884e+01,1.332268e-15],[-1.846939e+01,-1.066019e+01,1.332268e-15],[-1.868086e+01,-1.074204e+01,1.332268e-15],[-1.868086e+01,-1.074204e+01,1.332268e-15],[-1.846939e+01,-1.066019e+01,3.000000e+00],[-1.868086e+01,-1.074204e+01,3.000000e+00],[-1.846939e+01,-1.066019e+01,1.332268e-15],[-1.846939e+01,-1.066019e+01,3.000000e+00],[-1.868086e+01,-1.074204e+01,1.332268e-15],[-1.664816e+01,-9.833571e+00,3.000000e+00],[-1.546786e+01,-8.839484e+00,3.000000e+00],[-1.691562e+01,-1.005884e+01,3.000000e+00],[-1.664816e+01,-9.833571e+00,3.000000e+00],[-1.664816e+01,-9.833571e+00,1.332268e-15],[-1.546786e+01,-8.839484e+00,1.332268e-15],[-1.546786e+01,-8.839484e+00,1.332268e-15],[-1.546786e+01,-8.839484e+00,3.000000e+00],[-1.664816e+01,-9.833571e+00,3.000000e+00],[-1.691562e+01,-1.005884e+01,1.332268e-15],[-1.546786e+01,-8.839484e+00,1.332268e-15],[-1.664816e+01,-9.833571e+00,1.332268e-15],[-1.544725e+01,-8.805119e+00,3.000000e+00],[-1.546786e+01,-8.839484e+00,3.000000e+00],[-1.546786e+01,-8.839484e+00,1.332268e-15],[-1.544725e+01,-8.805119e+00,1.332268e-15],[-1.546786e+01,-8.839484e+00,1.332268e-15],[-1.449446e+01,-7.216111e+00,1.776357e-15],[-1.449446e+01,-7.216111e+00,3.000000e+00],[-1.546786e+01,-8.839484e+00,3.000000e+00],[-1.544725e+01,-8.805119e+00,3.000000e+00],[-1.544725e+01,-8.805119e+00,3.000000e+00],[-1.546786e+01,-8.839484e+00,1.332268e-15],[-1.544725e+01,-8.805119e+00,1.332268e-15],[-1.446222e+01,-7.064424e+00,1.776357e-15],[-1.413316e+01,-5.516321e+00,1.776357e-15],[-1.446222e+01,-7.064424e+00,3.000000e+00],[-1.413316e+01,-5.516321e+00,3.000000e+00],[-1.449446e+01,-7.216111e+00,3.000000e+00],[-1.446222e+01,-7.064424e+00,3.000000e+00],[-1.413316e+01,-5.516321e+00,3.000000e+00],[-1.446222e+01,-7.064424e+00,3.000000e+00],[-1.413316e+01,-5.516321e+00,1.776357e-15],[-1.413316e+01,-5.516321e+00,1.776357e-15],[-1.446222e+01,-7.064424e+00,1.776357e-15],[-1.449446e+01,-7.216111e+00,1.776357e-15],[-1.153600e+01,-5.243348e+00,2.220446e-15],[-1.153600e+01,-5.243348e+00,3.000000e+00],[-1.413316e+01,-5.516321e+00,3.000000e+00],[-1.413316e+01,-5.516321e+00,1.776357e-15],[-1.153600e+01,-5.243348e+00,2.220446e-15],[-1.413316e+01,-5.516321e+00,3.000000e+00],[-1.153600e+01,-5.243348e+00,3.000000e+00],[-1.153600e+01,-5.243348e+00,2.220446e-15],[-1.174506e+01,-3.254303e+00,3.000000e+00],[-1.174506e+01,-3.254303e+00,3.000000e+00],[-1.153600e+01,-5.243348e+00,2.220446e-15],[-1.174506e+01,-3.254303e+00,2.220446e-15],[-1.174506e+01,-3.254303e+00,3.000000e+00],[-1.174506e+01,-3.254303e+00,2.220446e-15],[-1.432503e+01,-3.525469e+00,3.000000e+00],[-1.432503e+01,-3.525469e+00,3.000000e+00],[-1.174506e+01,-3.254303e+00,2.220446e-15],[-1.432503e+01,-3.525469e+00,1.776357e-15],[-1.432503e+01,-3.525469e+00,3.000000e+00],[-1.432503e+01,-3.525469e+00,1.776357e-15],[-1.432988e+01,-3.485694e+00,3.000000e+00],[-1.432988e+01,-3.485694e+00,3.000000e+00],[-1.432503e+01,-3.525469e+00,1.776357e-15],[-1.432988e+01,-3.485694e+00,1.776357e-15],[-1.790235e+01,-4.637025e+00,1.332268e-15],[-1.826319e+01,-6.334633e+00,1.332268e-15],[-1.826319e+01,-6.334633e+00,3.000000e+00],[-1.790235e+01,-4.637025e+00,3.000000e+00],[-1.790235e+01,-4.637025e+00,1.332268e-15],[-1.826319e+01,-6.334633e+00,3.000000e+00],[-1.981541e+01,-7.110961e+00,8.881784e-16],[-1.981541e+01,-7.110961e+00,3.000000e+00],[-1.826319e+01,-6.334633e+00,1.332268e-15],[-1.826319e+01,-6.334633e+00,1.332268e-15],[-1.981541e+01,-7.110961e+00,3.000000e+00],[-1.826319e+01,-6.334633e+00,3.000000e+00],[-2.139017e+01,-6.381416e+00,8.881784e-16],[-2.139017e+01,-6.381416e+00,3.000000e+00],[-1.981541e+01,-7.110961e+00,8.881784e-16],[-1.981541e+01,-7.110961e+00,8.881784e-16],[-2.139017e+01,-6.381416e+00,3.000000e+00],[-1.981541e+01,-7.110961e+00,3.000000e+00],[-2.180163e+01,-4.695363e+00,8.881784e-16],[-2.180163e+01,-4.695363e+00,3.000000e+00],[-2.139017e+01,-6.381416e+00,8.881784e-16],[-2.139017e+01,-6.381416e+00,8.881784e-16],[-2.180163e+01,-4.695363e+00,3.000000e+00],[-2.139017e+01,-6.381416e+00,3.000000e+00],[-2.180163e+01,-4.695363e+00,8.881784e-16],[-2.073996e+01,-3.322430e+00,8.881784e-16],[-2.180163e+01,-4.695363e+00,3.000000e+00],[-2.180163e+01,-4.695363e+00,3.000000e+00],[-2.073996e+01,-3.322430e+00,8.881784e-16],[-2.073996e+01,-3.322430e+00,3.000000e+00],[-2.073996e+01,-3.322430e+00,3.000000e+00],[-2.073996e+01,-3.322430e+00,8.881784e-16],[-1.900462e+01,-3.296467e+00,1.332268e-15],[-1.900462e+01,-3.296467e+00,3.000000e+00],[-2.073996e+01,-3.322430e+00,3.000000e+00],[-1.900462e+01,-3.296467e+00,1.332268e-15],[-1.900462e+01,-3.296467e+00,3.000000e+00],[-1.900462e+01,-3.296467e+00,1.332268e-15],[-1.790235e+01,-4.637025e+00,1.332268e-15],[-1.790235e+01,-4.637025e+00,3.000000e+00],[-1.900462e+01,-3.296467e+00,3.000000e+00],[-1.790235e+01,-4.637025e+00,1.332268e-15],[-1.557621e+01,-1.224120e+01,3.000000e+00],[-1.664816e+01,-9.833571e+00,3.000000e+00],[-1.740330e+01,-1.305467e+01,3.000000e+00],[-1.740330e+01,-1.305467e+01,3.000000e+00],[-1.664816e+01,-9.833571e+00,3.000000e+00],[-1.691562e+01,-1.005884e+01,3.000000e+00],[-1.740330e+01,-1.305467e+01,3.000000e+00],[-1.691562e+01,-1.005884e+01,3.000000e+00],[-1.846939e+01,-1.066019e+01,3.000000e+00],[-1.740330e+01,-1.305467e+01,1.332268e-15],[-1.740330e+01,-1.305467e+01,3.000000e+00],[-1.846939e+01,-1.066019e+01,3.000000e+00],[-1.846939e+01,-1.066019e+01,1.332268e-15],[-1.740330e+01,-1.305467e+01,1.332268e-15],[-1.846939e+01,-1.066019e+01,3.000000e+00],[-1.664816e+01,-9.833571e+00,1.332268e-15],[-1.557621e+01,-1.224120e+01,1.332268e-15],[-1.740330e+01,-1.305467e+01,1.332268e-15],[-1.691562e+01,-1.005884e+01,1.332268e-15],[-1.664816e+01,-9.833571e+00,1.332268e-15],[-1.740330e+01,-1.305467e+01,1.332268e-15],[-1.846939e+01,-1.066019e+01,1.332268e-15],[-1.691562e+01,-1.005884e+01,1.332268e-15],[-1.740330e+01,-1.305467e+01,1.332268e-15],[-1.557621e+01,-1.224120e+01,3.000000e+00],[-1.557621e+01,-1.224120e+01,1.332268e-15],[-1.664816e+01,-9.833571e+00,3.000000e+00],[-1.664816e+01,-9.833571e+00,3.000000e+00],[-1.557621e+01,-1.224120e+01,1.332268e-15],[-1.664816e+01,-9.833571e+00,1.332268e-15],[-1.220062e+01,-8.370161e+00,3.000000e+00],[-1.446222e+01,-7.064424e+00,3.000000e+00],[-1.320062e+01,-1.010221e+01,3.000000e+00],[-1.320062e+01,-1.010221e+01,3.000000e+00],[-1.446222e+01,-7.064424e+00,3.000000e+00],[-1.449446e+01,-7.216111e+00,3.000000e+00],[-1.320062e+01,-1.010221e+01,3.000000e+00],[-1.449446e+01,-7.216111e+00,3.000000e+00],[-1.544725e+01,-8.805119e+00,3.000000e+00],[-1.320062e+01,-1.010221e+01,1.776357e-15],[-1.320062e+01,-1.010221e+01,3.000000e+00],[-1.544725e+01,-8.805119e+00,3.000000e+00],[-1.544725e+01,-8.805119e+00,1.332268e-15],[-1.320062e+01,-1.010221e+01,1.776357e-15],[-1.544725e+01,-8.805119e+00,3.000000e+00],[-1.446222e+01,-7.064424e+00,1.776357e-15],[-1.220062e+01,-8.370161e+00,1.776357e-15],[-1.320062e+01,-1.010221e+01,1.776357e-15],[-1.449446e+01,-7.216111e+00,1.776357e-15],[-1.446222e+01,-7.064424e+00,1.776357e-15],[-1.320062e+01,-1.010221e+01,1.776357e-15],[-1.544725e+01,-8.805119e+00,1.332268e-15],[-1.449446e+01,-7.216111e+00,1.776357e-15],[-1.320062e+01,-1.010221e+01,1.776357e-15],[-1.220062e+01,-8.370161e+00,3.000000e+00],[-1.220062e+01,-8.370161e+00,1.776357e-15],[-1.446222e+01,-7.064424e+00,3.000000e+00],[-1.446222e+01,-7.064424e+00,3.000000e+00],[-1.220062e+01,-8.370161e+00,1.776357e-15],[-1.446222e+01,-7.064424e+00,1.776357e-15],[-1.557621e+01,-1.224120e+01,1.332268e-15],[-1.557621e+01,-1.224120e+01,3.000000e+00],[-1.740330e+01,-1.305467e+01,3.000000e+00],[-1.740330e+01,-1.305467e+01,1.332268e-15],[-1.557621e+01,-1.224120e+01,1.332268e-15],[-1.740330e+01,-1.305467e+01,3.000000e+00],[-1.220062e+01,-8.370161e+00,3.000000e+00],[-1.320062e+01,-1.010221e+01,3.000000e+00],[-1.220062e+01,-8.370161e+00,1.776357e-15],[-1.220062e+01,-8.370161e+00,1.776357e-15],[-1.320062e+01,-1.010221e+01,3.000000e+00],[-1.320062e+01,-1.010221e+01,1.776357e-15] ],
faces=[[0,1,2],[3,4,5],[6,7,8],[9,10,11],[12,13,14],[15,16,17],[18,19,20],[21,22,23],[24,25,26],[27,28,29],[30,31,32],[33,34,35],[36,37,38],[39,40,41],[42,43,44],[45,46,47],[48,49,50],[51,52,53],[54,55,56],[57,58,59],[60,61,62],[63,64,65],[66,67,68],[69,70,71],[72,73,74],[75,76,77],[78,79,80],[81,82,83],[84,85,86],[87,88,89],[90,91,92],[93,94,95],[96,97,98],[99,100,101],[102,103,104],[105,106,107],[108,109,110],[111,112,113],[114,115,116],[117,118,119],[120,121,122],[123,124,125],[126,127,128],[129,130,131],[132,133,134],[135,136,137],[138,139,140],[141,142,143],[144,145,146],[147,148,149],[150,151,152],[153,154,155],[156,157,158],[159,160,161],[162,163,164],[165,166,167],[168,169,170],[171,172,173],[174,175,176],[177,178,179],[180,181,182],[183,184,185],[186,187,188],[189,190,191],[192,193,194],[195,196,197],[198,199,200],[201,202,203],[204,205,206],[207,208,209],[210,211,212],[213,214,215],[216,217,218],[219,220,221],[222,223,224],[225,226,227],[228,229,230],[231,232,233],[234,235,236],[237,238,239],[240,241,242],[243,244,245],[246,247,248],[249,250,251],[252,253,254],[255,256,257],[258,259,260],[261,262,263],[264,265,266],[267,268,269],[270,271,272],[273,274,275],[276,277,278],[279,280,281],[282,283,284],[285,286,287],[288,289,290],[291,292,293],[294,295,296],[297,298,299],[300,301,302],[303,304,305],[306,307,308],[309,310,311],[312,313,314],[315,316,317],[318,319,320],[321,322,323],[324,325,326],[327,328,329],[330,331,332],[333,334,335],[336,337,338],[339,340,341],[342,343,344],[345,346,347],[348,349,350],[351,352,353],[354,355,356],[357,358,359],[360,361,362],[363,364,365],[366,367,368],[369,370,371],[372,373,374],[375,376,377],[378,379,380],[381,382,383],[384,385,386],[387,388,389],[390,391,392],[393,394,395],[396,397,398],[399,400,401],[402,403,404],[405,406,407],[408,409,410],[411,412,413],[414,415,416],[417,418,419],[420,421,422],[423,424,425],[426,427,428],[429,430,431],[432,433,434],[435,436,437],[438,439,440],[441,442,443],[444,445,446],[447,448,449],[450,451,452],[453,454,455],[456,457,458],[459,460,461],[462,463,464],[465,466,467],[468,469,470],[471,472,473],[474,475,476],[477,478,479],[480,481,482],[483,484,485],[486,487,488],[489,490,491],[492,493,494],[495,496,497],[498,499,500],[501,502,503],[504,505,506],[507,508,509],[510,511,512],[513,514,515],[516,517,518],[519,520,521],[522,523,524],[525,526,527],[528,529,530],[531,532,533],[534,535,536],[537,538,539],[540,541,542],[543,544,545],[546,547,548],[549,550,551],[552,553,554],[555,556,557],[558,559,560],[561,562,563],[564,565,566],[567,568,569],[570,571,572],[573,574,575],[576,577,578],[579,580,581],[582,583,584],[585,586,587],[588,589,590],[591,592,593],[594,595,596],[597,598,599],[600,601,602],[603,604,605],[606,607,608],[609,610,611],[612,613,614],[615,616,617],[618,619,620],[621,622,623],[624,625,626],[627,628,629],[630,631,632],[633,634,635],[636,637,638],[639,640,641],[642,643,644],[645,646,647],[648,649,650],[651,652,653],[654,655,656],[657,658,659],[660,661,662],[663,664,665],[666,667,668],[669,670,671],[672,673,674],[675,676,677],[678,679,680],[681,682,683],[684,685,686],[687,688,689],[690,691,692],[693,694,695],[696,697,698],[699,700,701],[702,703,704],[705,706,707],[708,709,710],[711,712,713],[714,715,716],[717,718,719],[720,721,722],[723,724,725],[726,727,728],[729,730,731],[732,733,734],[735,736,737],[738,739,740],[741,742,743],[744,745,746],[747,748,749],[750,751,752],[753,754,755],[756,757,758],[759,760,761],[762,763,764],[765,766,767],[768,769,770],[771,772,773],[774,775,776],[777,778,779],[780,781,782],[783,784,785],[786,787,788],[789,790,791],[792,793,794],[795,796,797],[798,799,800],[801,802,803],[804,805,806],[807,808,809],[810,811,812],[813,814,815]]);}

object1(1);
